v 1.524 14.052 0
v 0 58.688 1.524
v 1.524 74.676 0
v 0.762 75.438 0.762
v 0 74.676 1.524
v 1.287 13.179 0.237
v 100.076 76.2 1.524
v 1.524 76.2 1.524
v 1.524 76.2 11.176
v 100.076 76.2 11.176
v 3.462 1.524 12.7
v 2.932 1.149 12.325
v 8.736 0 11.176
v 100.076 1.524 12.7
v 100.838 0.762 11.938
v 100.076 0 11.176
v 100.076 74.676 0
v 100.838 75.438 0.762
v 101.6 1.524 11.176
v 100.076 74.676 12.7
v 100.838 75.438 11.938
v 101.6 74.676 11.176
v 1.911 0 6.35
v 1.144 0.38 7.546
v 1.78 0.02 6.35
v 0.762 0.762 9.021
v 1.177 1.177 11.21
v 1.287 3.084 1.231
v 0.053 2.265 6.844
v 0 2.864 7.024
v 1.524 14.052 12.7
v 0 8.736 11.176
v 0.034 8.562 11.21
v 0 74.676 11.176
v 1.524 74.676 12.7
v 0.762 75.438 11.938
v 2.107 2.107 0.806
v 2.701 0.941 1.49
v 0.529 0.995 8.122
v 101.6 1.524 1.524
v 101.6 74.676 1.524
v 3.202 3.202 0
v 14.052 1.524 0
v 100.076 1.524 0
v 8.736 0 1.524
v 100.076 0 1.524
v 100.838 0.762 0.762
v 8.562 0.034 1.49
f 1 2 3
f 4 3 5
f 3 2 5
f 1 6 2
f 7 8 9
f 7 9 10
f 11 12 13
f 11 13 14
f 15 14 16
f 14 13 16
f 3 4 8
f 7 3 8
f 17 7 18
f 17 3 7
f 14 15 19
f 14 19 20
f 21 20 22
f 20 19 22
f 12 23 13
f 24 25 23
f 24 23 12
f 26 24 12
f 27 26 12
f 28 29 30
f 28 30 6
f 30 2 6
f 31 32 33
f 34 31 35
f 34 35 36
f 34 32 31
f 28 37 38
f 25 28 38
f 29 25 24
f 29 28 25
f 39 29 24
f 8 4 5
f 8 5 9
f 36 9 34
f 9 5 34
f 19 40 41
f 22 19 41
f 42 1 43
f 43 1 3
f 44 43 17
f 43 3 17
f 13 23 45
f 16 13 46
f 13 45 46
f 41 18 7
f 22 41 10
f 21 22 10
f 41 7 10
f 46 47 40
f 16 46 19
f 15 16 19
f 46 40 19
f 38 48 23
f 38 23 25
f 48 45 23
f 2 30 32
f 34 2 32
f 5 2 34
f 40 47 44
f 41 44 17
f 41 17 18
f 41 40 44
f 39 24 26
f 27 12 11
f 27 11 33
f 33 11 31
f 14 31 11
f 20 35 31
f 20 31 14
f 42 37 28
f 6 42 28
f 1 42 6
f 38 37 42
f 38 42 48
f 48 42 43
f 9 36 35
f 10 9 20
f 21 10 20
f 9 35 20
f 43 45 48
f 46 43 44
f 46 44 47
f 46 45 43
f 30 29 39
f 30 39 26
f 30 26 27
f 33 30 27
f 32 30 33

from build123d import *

# Parameters (mm, degrees)
SKETCH1_W        = 101.6
SKETCH1_H        = 76.2
PLATE_DEPTH      = 12.7
CHAMFER1_SIZE    = 1.524
CHAMFER3_SIZE    = 1.524
CHAMFER5_SIZE    = 1.524
CHAMFER7_SIZE    = 1.524
CHAMFER7_SIZE2   = 4.163645431
CHAMFER9_SIZE    = 1.524
CHAMFER9_SIZE2   = 4.163645431
CHAMFER10_SIZE   = 1.524
CHAMFER10_SIZE2  = 4.163645431
CHAMFER11_SIZE   = 1.524
CHAMFER11_SIZE2  = 1.98931977
CHAMFER12_SIZE   = 1.524
CHAMFER12_SIZE2  = 1.98931977
CHAMFER14_SIZE   = 1.524
CHAMFER14_SIZE2  = 2.500509831
CHAMFER18_SIZE   = 1.524
CHAMFER18_SIZE2  = 1.98931977
CHAMFER19_SIZE   = 4.927310365
CHAMFER19_SIZE_2 = 1.524
CHAMFER27_SIZE   = 4.163645431
CHAMFER27_SIZE_2 = 1.524
CHAMFER29_SIZE   = 1.524
CHAMFER33_SIZE   = 1.524
CHAMFER37_SIZE   = 1.524
CHAMFER41_SIZE   = 1.524
CHAMFER43_SIZE   = 1.524
CHAMFER47_SIZE   = 1.524
CHAMFER52_SIZE   = 1.524
CHAMFER57_SIZE   = 1.524
CHAMFER59_SIZE   = 1.524
CHAMFER63_SIZE   = 1.524
CHAMFER68_SIZE   = 1.524


with BuildPart() as part:
    # Sketch1 → plate (new body)
    with BuildSketch(Plane.XY):
        with Locations((50.8, 38.1)):
            Rectangle(SKETCH1_W, SKETCH1_H)
    extrude(amount=PLATE_DEPTH)

    # Chamfer1
    chamfer1_edges = [part.edges().sort_by_distance(p)[0] for p in [
        (0, 0, 6.35),
    ]]
    chamfer(chamfer1_edges, length=CHAMFER1_SIZE)

    # Chamfer3
    chamfer3_edges = [part.edges().sort_by_distance(p)[0] for p in [
        (0.762, 0.762, 0),
    ]]
    chamfer(chamfer3_edges, length=CHAMFER3_SIZE)

    # Chamfer5
    chamfer5_edges = [part.edges().sort_by_distance(p)[0] for p in [
        (0.762, 0.762, 12.7),
    ]]
    chamfer(chamfer5_edges, length=CHAMFER5_SIZE)

    # Chamfer7
    chamfer7_edges = [part.edges().sort_by_distance(p)[0] for p in [
        (0, 2.601630735, 0.762),
    ]]
    chamfer7_side = [part.faces().sort_by_distance(p)[0] for p in [
        (1.375210245, 1.375210245, 0.656789755),
    ]]
    chamfer(chamfer7_edges, length=CHAMFER7_SIZE, length2=CHAMFER7_SIZE2, reference=chamfer7_side[0])

    # Chamfer9
    chamfer9_edges = [part.edges().sort_by_distance(p)[0] for p in [
        (2.601630735, 0, 0.762),
    ]]
    chamfer9_side = [part.faces().sort_by_distance(p)[0] for p in [
        (2.111722816, 0.7919001, 0.548459281),
    ]]
    chamfer(chamfer9_edges, length=CHAMFER9_SIZE, length2=CHAMFER9_SIZE2, reference=chamfer9_side[0])

    # Chamfer10
    chamfer10_edges = [part.edges().sort_by_distance(p)[0] for p in [
        (0, 2.601630735, 11.938),
    ]]
    chamfer10_side = [part.faces().sort_by_distance(p)[0] for p in [
        (1.375210245, 1.375210245, 12.043210245),
    ]]
    chamfer(chamfer10_edges, length=CHAMFER10_SIZE, length2=CHAMFER10_SIZE2, reference=chamfer10_side[0])

    # Chamfer11
    chamfer11_edges = [part.edges().sort_by_distance(p)[0] for p in [
        (0.659911358, 6.625172827, 0),
    ]]
    chamfer11_side = [part.faces().sort_by_distance(p)[0] for p in [
        (0.497022665, 4.4128662, 2.308870295),
    ]]
    chamfer(chamfer11_edges, length=CHAMFER11_SIZE, length2=CHAMFER11_SIZE2, reference=chamfer11_side[0])

    # Chamfer12
    chamfer12_edges = [part.edges().sort_by_distance(p)[0] for p in [
        (7.206175842, 0.570029878, 0),
    ]]
    chamfer12_side = [part.faces().sort_by_distance(p)[0] for p in [
        (4.492487224, 0.46863969, 2.38230292),
    ]]
    chamfer(chamfer12_edges, length=CHAMFER12_SIZE, length2=CHAMFER12_SIZE2, reference=chamfer12_side[0])

    # Chamfer14
    chamfer14_edges = [part.edges().sort_by_distance(p)[0] for p in [
        (0.96943787, 0.96943787, 2.584421635),
    ]]
    chamfer14_side = [part.faces().sort_by_distance(p)[0] for p in [
        (3.644155143, 0.409792278, 3.25114463),
    ]]
    chamfer(chamfer14_edges, length=CHAMFER14_SIZE, length2=CHAMFER14_SIZE2, reference=chamfer14_side[0])

    # Chamfer18
    chamfer18_edges = [part.edges().sort_by_distance(p)[0] for p in [
        (0.659911358, 6.625172827, 12.7),
    ]]
    chamfer18_side = [part.faces().sort_by_distance(p)[0] for p in [
        (0.533202333, 4.341451886, 10.506002546),
    ]]
    chamfer(chamfer18_edges, length=CHAMFER18_SIZE, length2=CHAMFER18_SIZE2, reference=chamfer18_side[0])

    # Chamfer19
    # the kernel refuses this chamfer: 4.927310365, 1.524 mm, written as the material it takes off along each edge
    with BuildSketch(Plane(origin=(0, -3.953536059, 2.744587717), x_dir=(0, 0.09805092210800737, 0.9951813988785008), z_dir=(0, 0.9951813988785007, -0.09805092210800735))) as chamfer19_piece_1:
        Polygon((CHAMFER19_SIZE, 0), (-CHAMFER19_SIZE_2 * 0.53534007825, CHAMFER19_SIZE_2 * 0.844636608619), (0, 0), align=None)
    extrude(amount=91.989112447, mode=Mode.SUBTRACT)

    # Chamfer27
    # the kernel refuses this chamfer: 4.163645431, 1.524 mm, written as the material it takes off along each edge
    with BuildSketch(Plane(origin=(-7.303820514, 0, 4.933788251), x_dir=(0.5773502691896255, 0, -0.8164965809277261), z_dir=(0.8164965809277263, 0, 0.5773502691896256))) as chamfer27_piece_1:
        Polygon((CHAMFER27_SIZE, 0), (-CHAMFER27_SIZE_2 * 0.5, CHAMFER27_SIZE_2 * 0.866025403784), (0, 0), align=None)
    extrude(amount=24.057251609, mode=Mode.SUBTRACT)

    # Chamfer29
    chamfer29_edges = [part.edges().sort_by_distance(p)[0] for p in [
        (101.6, 0, 6.35),
    ]]
    chamfer(chamfer29_edges, length=CHAMFER29_SIZE)

    # Chamfer33
    chamfer33_edges = [part.edges().sort_by_distance(p)[0] for p in [
        (101.6, 76.2, 6.35),
    ]]
    chamfer(chamfer33_edges, length=CHAMFER33_SIZE)

    # Chamfer37
    chamfer37_edges = [part.edges().sort_by_distance(p)[0] for p in [
        (0, 76.2, 6.35),
    ]]
    chamfer(chamfer37_edges, length=CHAMFER37_SIZE)

    # Chamfer41
    chamfer41_edges = [part.edges().sort_by_distance(p)[0] for p in [
        (50.8, 76.2, 12.7),
    ]]
    chamfer(chamfer41_edges, length=CHAMFER41_SIZE)

    # Chamfer43
    chamfer43_edges = [part.edges().sort_by_distance(p)[0] for p in [
        (101.6, 38.1, 12.7),
    ]]
    chamfer(chamfer43_edges, length=CHAMFER43_SIZE)

    # Chamfer47
    chamfer47_edges = [part.edges().sort_by_distance(p)[0] for p in [
        (55.48345345, 0, 12.7),
    ]]
    chamfer(chamfer47_edges, length=CHAMFER47_SIZE)

    # Chamfer52
    chamfer52_edges = [part.edges().sort_by_distance(p)[0] for p in [
        (0, 49.289518337, 12.7),
    ]]
    chamfer(chamfer52_edges, length=CHAMFER52_SIZE)

    # Chamfer57
    chamfer57_edges = [part.edges().sort_by_distance(p)[0] for p in [
        (50.8, 76.2, 0),
    ]]
    chamfer(chamfer57_edges, length=CHAMFER57_SIZE)

    # Chamfer59
    chamfer59_edges = [part.edges().sort_by_distance(p)[0] for p in [
        (101.6, 38.1, 0),
    ]]
    chamfer(chamfer59_edges, length=CHAMFER59_SIZE)

    # Chamfer63
    chamfer63_edges = [part.edges().sort_by_distance(p)[0] for p in [
        (61.989518337, 0, 0),
    ]]
    chamfer(chamfer63_edges, length=CHAMFER63_SIZE)

    # Chamfer68
    chamfer68_edges = [part.edges().sort_by_distance(p)[0] for p in [
        (0, 74.415800982, 0),
    ]]
    chamfer(chamfer68_edges, length=CHAMFER68_SIZE)


solid = part.part
